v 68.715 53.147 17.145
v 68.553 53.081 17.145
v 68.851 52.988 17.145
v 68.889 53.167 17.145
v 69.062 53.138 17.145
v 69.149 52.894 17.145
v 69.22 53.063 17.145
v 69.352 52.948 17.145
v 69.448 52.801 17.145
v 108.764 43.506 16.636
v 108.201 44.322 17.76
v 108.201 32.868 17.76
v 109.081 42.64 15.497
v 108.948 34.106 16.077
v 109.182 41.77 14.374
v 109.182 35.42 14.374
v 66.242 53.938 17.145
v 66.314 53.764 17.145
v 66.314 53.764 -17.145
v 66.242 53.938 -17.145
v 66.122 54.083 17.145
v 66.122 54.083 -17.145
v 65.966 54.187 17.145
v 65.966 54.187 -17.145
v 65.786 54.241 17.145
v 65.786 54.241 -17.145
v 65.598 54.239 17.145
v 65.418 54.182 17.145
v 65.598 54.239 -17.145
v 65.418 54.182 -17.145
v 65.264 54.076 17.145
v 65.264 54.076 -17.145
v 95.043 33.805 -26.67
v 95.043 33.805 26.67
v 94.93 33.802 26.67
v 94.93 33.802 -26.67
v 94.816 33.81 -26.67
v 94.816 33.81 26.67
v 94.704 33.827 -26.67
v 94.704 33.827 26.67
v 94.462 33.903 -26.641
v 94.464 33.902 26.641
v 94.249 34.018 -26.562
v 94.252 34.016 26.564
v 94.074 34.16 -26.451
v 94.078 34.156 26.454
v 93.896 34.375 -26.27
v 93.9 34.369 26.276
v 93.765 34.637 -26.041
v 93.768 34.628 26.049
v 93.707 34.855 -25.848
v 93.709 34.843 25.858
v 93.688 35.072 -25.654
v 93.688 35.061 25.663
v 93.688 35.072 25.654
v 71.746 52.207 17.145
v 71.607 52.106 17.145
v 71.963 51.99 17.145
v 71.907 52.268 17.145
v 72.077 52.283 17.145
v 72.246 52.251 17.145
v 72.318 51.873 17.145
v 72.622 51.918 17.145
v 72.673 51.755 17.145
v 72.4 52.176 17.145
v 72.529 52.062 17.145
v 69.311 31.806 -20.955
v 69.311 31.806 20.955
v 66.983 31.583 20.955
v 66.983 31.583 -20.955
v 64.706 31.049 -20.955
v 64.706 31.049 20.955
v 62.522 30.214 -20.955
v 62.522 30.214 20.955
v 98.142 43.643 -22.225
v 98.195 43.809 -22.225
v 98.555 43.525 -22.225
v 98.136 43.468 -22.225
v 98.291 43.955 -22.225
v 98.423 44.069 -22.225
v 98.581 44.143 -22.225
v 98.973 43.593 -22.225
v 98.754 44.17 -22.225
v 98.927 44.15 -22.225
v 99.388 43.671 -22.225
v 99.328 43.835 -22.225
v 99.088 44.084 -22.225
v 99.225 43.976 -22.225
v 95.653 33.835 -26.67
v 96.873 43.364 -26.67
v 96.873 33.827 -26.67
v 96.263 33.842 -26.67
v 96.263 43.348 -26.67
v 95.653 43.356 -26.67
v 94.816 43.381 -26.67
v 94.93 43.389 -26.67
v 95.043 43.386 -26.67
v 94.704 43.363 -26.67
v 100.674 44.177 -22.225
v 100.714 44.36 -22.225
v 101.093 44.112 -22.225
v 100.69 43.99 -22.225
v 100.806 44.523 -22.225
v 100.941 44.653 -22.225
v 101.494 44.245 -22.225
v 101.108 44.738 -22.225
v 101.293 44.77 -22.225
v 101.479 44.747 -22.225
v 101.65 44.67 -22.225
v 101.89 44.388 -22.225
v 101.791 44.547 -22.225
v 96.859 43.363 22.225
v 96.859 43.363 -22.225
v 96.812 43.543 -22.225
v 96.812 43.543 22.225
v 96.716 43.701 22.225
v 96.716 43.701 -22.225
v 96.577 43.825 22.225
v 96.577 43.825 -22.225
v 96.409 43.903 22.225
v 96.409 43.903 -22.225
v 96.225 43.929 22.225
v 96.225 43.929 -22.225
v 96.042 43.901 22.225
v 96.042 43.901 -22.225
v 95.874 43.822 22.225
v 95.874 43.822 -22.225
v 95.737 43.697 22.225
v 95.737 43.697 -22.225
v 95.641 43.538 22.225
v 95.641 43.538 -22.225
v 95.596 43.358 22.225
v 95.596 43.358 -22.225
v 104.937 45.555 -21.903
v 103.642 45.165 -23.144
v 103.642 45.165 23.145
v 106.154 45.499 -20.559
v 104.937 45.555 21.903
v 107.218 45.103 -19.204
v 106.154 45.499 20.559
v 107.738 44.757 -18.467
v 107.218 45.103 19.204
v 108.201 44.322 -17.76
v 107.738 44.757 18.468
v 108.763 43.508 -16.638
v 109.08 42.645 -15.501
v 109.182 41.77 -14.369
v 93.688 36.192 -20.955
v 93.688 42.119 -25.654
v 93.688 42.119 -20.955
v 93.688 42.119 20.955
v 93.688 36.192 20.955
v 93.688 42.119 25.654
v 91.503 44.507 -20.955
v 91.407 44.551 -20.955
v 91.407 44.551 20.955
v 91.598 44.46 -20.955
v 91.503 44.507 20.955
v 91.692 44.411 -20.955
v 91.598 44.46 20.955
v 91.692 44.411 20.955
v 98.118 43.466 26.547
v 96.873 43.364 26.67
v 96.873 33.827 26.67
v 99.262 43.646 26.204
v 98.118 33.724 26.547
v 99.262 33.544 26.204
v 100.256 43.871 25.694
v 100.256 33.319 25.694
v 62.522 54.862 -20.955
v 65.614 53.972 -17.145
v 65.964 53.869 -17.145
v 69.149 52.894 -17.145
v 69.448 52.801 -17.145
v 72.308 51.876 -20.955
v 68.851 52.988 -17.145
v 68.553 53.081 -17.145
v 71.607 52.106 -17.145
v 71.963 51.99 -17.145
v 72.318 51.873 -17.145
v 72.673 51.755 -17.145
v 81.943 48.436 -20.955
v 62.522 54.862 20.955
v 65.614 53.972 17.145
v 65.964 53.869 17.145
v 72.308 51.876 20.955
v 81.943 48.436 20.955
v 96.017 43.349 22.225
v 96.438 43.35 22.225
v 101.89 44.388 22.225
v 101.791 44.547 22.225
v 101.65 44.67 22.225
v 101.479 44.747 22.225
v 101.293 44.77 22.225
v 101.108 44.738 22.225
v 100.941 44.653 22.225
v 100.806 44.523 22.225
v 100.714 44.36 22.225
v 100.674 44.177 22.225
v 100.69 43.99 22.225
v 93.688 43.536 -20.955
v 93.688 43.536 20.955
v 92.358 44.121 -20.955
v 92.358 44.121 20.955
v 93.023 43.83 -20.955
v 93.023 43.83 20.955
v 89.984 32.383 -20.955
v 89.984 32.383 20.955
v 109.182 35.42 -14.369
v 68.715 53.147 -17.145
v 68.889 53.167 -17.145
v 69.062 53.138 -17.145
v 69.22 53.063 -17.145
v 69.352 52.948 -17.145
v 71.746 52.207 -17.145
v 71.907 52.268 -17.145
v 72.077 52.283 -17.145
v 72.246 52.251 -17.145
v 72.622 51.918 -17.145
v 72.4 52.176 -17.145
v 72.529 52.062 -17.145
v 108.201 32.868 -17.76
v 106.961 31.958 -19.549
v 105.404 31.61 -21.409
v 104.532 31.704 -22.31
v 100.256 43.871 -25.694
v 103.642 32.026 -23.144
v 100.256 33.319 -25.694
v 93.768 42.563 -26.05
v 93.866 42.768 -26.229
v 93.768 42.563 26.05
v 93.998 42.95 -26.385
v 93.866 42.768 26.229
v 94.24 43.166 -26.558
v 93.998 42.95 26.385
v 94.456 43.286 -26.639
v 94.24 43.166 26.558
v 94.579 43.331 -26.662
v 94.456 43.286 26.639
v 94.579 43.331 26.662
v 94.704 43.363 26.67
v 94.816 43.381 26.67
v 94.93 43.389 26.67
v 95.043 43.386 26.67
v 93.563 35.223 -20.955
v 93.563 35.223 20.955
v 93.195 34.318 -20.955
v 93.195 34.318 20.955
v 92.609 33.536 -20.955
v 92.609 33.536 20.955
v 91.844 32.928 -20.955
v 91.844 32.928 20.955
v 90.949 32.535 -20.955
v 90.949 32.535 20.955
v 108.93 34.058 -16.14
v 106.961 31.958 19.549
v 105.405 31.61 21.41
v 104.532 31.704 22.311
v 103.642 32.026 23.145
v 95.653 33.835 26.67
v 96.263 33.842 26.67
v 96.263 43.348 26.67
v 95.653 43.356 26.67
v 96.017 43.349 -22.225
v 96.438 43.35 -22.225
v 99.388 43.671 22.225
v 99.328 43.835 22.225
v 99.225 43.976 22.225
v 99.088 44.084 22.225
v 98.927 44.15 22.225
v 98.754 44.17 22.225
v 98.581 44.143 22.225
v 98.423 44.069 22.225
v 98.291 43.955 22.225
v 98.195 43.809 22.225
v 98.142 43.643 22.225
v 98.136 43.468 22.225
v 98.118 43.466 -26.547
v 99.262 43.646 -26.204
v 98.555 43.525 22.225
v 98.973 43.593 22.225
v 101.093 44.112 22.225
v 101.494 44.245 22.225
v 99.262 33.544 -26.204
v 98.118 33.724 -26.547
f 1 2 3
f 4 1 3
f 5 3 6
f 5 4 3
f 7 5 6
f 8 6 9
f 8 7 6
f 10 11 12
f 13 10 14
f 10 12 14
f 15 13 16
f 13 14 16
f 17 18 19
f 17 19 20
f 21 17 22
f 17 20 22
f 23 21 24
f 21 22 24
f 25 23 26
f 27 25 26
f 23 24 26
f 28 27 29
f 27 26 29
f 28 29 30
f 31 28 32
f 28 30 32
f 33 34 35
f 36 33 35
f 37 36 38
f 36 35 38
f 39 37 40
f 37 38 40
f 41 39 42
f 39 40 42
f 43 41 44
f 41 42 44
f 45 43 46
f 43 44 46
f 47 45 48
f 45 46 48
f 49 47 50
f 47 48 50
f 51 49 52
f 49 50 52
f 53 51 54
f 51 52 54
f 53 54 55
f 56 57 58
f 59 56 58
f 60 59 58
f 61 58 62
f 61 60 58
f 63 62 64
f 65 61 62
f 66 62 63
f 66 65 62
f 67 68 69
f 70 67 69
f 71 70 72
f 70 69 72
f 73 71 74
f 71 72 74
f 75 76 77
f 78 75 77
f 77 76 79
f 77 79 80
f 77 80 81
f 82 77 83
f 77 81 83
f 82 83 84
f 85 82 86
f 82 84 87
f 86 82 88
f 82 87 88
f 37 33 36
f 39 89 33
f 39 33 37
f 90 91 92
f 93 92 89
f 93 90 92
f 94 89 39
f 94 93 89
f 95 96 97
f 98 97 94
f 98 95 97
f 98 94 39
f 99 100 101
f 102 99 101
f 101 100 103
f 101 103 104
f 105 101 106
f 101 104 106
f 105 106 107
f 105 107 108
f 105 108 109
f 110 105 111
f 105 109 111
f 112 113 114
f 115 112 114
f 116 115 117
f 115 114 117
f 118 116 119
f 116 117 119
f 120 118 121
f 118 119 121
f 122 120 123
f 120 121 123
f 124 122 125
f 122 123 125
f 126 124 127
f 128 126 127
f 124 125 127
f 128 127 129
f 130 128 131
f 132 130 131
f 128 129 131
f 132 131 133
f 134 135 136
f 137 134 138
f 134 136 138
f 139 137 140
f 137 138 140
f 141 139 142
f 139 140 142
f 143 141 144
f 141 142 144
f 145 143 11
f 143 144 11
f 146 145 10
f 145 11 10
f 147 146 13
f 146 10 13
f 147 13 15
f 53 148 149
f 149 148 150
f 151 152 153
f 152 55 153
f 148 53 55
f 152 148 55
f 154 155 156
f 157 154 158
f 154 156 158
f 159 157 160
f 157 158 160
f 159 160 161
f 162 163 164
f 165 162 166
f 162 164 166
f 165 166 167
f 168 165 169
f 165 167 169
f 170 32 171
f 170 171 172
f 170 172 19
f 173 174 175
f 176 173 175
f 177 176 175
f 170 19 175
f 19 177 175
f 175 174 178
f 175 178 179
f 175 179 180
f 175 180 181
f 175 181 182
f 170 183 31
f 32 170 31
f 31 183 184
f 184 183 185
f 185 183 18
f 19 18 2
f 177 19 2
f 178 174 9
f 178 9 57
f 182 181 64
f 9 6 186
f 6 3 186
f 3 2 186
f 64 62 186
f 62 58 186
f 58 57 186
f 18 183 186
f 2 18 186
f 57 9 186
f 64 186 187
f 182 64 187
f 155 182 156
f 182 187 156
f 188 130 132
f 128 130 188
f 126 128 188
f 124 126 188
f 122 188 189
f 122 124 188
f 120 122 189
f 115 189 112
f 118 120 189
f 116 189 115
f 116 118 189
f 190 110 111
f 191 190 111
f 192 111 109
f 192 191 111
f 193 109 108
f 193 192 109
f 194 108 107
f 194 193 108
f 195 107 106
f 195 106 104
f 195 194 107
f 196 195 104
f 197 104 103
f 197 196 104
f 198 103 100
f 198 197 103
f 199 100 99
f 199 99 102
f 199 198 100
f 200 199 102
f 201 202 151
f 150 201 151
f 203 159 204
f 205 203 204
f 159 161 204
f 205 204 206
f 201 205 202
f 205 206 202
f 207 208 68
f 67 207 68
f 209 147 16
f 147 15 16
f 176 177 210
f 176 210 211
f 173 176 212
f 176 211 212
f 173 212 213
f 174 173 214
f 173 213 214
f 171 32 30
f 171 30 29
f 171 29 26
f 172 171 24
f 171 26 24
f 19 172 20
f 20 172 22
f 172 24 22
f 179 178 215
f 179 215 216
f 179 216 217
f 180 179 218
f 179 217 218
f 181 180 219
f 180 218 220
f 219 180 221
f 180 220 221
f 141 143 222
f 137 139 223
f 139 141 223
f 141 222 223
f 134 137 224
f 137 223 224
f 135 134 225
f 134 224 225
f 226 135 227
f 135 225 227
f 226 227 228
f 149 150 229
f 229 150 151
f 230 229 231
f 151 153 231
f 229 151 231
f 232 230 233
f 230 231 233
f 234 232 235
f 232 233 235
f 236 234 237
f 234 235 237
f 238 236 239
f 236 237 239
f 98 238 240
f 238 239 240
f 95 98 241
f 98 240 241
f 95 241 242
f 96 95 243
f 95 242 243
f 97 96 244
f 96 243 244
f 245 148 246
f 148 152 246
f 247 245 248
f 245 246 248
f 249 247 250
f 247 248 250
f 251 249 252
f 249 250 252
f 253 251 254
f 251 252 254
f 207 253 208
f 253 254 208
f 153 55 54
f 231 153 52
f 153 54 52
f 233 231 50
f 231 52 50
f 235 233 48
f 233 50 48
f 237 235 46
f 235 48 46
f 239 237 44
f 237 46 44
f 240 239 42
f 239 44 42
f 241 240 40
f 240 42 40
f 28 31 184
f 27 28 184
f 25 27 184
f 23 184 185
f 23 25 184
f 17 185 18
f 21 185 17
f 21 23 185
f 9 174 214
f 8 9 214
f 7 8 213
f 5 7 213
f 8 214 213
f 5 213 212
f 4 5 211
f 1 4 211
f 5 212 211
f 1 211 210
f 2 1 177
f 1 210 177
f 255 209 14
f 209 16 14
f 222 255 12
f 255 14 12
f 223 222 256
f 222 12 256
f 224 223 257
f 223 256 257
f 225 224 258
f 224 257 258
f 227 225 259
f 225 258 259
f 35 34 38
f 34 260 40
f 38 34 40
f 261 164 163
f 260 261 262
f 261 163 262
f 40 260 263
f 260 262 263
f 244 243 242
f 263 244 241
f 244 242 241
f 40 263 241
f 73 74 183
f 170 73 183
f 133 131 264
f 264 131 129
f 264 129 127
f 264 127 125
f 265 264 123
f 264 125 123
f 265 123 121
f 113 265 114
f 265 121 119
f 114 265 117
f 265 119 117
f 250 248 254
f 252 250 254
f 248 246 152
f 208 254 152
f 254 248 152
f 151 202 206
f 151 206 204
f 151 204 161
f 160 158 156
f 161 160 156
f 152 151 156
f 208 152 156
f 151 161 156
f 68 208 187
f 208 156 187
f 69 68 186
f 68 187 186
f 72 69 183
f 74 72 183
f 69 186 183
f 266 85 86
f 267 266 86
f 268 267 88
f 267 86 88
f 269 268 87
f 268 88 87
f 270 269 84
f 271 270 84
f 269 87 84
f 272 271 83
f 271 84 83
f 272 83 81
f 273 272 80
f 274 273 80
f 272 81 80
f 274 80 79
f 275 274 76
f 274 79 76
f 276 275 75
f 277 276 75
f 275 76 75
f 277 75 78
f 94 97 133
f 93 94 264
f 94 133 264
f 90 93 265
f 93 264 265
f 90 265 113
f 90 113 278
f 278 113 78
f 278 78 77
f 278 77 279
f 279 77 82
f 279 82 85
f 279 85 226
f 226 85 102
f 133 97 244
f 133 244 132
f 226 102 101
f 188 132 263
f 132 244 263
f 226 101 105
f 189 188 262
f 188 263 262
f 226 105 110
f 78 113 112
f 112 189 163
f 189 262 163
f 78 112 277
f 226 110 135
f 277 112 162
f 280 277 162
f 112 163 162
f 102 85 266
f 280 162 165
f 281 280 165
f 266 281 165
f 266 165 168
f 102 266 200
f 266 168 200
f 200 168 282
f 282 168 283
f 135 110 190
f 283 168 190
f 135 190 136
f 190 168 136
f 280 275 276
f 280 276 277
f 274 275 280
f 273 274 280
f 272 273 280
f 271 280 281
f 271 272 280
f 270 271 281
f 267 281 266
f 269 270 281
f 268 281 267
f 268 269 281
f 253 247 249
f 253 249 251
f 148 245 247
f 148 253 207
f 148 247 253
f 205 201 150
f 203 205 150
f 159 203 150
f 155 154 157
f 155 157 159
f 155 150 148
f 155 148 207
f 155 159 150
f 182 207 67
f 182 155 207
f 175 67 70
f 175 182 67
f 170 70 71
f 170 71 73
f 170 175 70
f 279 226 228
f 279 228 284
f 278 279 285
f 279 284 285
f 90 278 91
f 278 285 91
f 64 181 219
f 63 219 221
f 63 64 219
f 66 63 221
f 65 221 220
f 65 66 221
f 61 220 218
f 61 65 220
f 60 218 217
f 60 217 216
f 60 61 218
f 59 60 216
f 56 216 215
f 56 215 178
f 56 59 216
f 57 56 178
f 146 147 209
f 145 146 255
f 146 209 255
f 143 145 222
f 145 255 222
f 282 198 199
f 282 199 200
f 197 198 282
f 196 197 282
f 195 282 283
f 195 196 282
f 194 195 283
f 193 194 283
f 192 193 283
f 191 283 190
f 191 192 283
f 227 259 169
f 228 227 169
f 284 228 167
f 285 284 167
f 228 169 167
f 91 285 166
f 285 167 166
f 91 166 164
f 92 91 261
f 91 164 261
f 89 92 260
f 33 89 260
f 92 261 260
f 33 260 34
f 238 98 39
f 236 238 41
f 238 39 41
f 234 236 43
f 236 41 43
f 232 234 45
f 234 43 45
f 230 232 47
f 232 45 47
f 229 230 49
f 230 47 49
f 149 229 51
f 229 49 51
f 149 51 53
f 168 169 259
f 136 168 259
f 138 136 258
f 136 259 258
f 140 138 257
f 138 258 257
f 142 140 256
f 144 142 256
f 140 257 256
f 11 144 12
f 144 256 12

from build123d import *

# Parameters (mm, degrees)
EXT_PEDAL_STEM_DEPTH     = 20.955
EXT_FOOT_SIDE_DEPTH      = 26.67
CUT_FOOT_PLAN_DEPTH      = 126.067228803
CUT_FOOT_PLAN_DEPTH_BACK = 126.067228803
SK_RIBS_STEM_R           = 0.635
EXT_RIBS_STEM_DEPTH      = 17.145
SK_RIBS_FOOT_R           = 0.635
EXT_RIBS_FOOT_DEPTH      = 22.225


with BuildPart() as part:
    # Sk_pedal_stem → Ext_pedal_stem (new, symmetric)
    with BuildSketch(Plane.XY):
        with BuildLine():
            Line((62.5221, 30.214062), (62.5221, 54.861968))
            ThreePointArc((62.5221, 54.861968), (77.145265739, 50.212536002), (91.40698, 44.550584))
            ThreePointArc((91.40698, 44.550584), (91.550950572, 44.483878693), (91.691968, 44.411138))
            ThreePointArc((91.691968, 44.411138), (92.690956134, 43.975699122), (93.6879, 43.5356))
            Line((93.6879, 43.5356), (93.6879, 36.191698))
            ThreePointArc((93.6879, 36.191698), (92.609350592, 33.535520735), (89.984326, 32.383222))
            Line((89.984326, 32.383222), (69.311266, 31.805626))
            ThreePointArc((69.311266, 31.805626), (65.835901534, 31.354435095), (62.5221, 30.214062))
        make_face()
    extrude(amount=EXT_PEDAL_STEM_DEPTH, both=True)

    # Sk_foot_side → Ext_foot_side (add, symmetric)
    with BuildSketch(Plane.XY):
        with BuildLine():
            Line((93.6879, 35.071812), (93.6879, 42.118788))
            ThreePointArc((93.6879, 42.118788), (94.090678285, 43.046595361), (95.043498, 43.385994))
            ThreePointArc((95.043498, 43.385994), (99.464687923, 43.686511406), (103.64216, 45.16501))
            ThreePointArc((103.64216, 45.16501), (107.36259935, 45.018864691), (109.1819, 41.7703))
            Line((109.1819, 41.7703), (109.1819, 35.4203))
            ThreePointArc((109.1819, 35.4203), (107.362602336, 32.171730436), (103.64216, 32.02559))
            ThreePointArc((103.64216, 32.02559), (99.464578688, 33.503560617), (95.043498, 33.804606))
            ThreePointArc((95.043498, 33.804606), (94.090614283, 34.143936173), (93.6879, 35.071812))
        make_face()
    extrude(amount=EXT_FOOT_SIDE_DEPTH, both=True)

    # Sk_foot_plan_trim → Cut_foot_plan (cut, two sides: drawn at the far end of the back side and taken through both)
    with BuildSketch(Plane(origin=(0, 0, 0), x_dir=(1, 0, 0), z_dir=(0, 1, 0)).offset(-CUT_FOOT_PLAN_DEPTH_BACK)):
        with BuildLine():
            Line((94.7039, -26.67), (96.87306, -26.67))
            ThreePointArc((96.87306, -26.67), (98.633684187, -26.421041098), (100.25634, -25.693878))
            ThreePointArc((100.25634, -25.693878), (104.672679306, -22.171677589), (108.200952, -17.760188))
            ThreePointArc((108.200952, -17.760188), (108.932068295, -16.134088594), (109.1819, -14.36878))
            Line((109.1819, -14.36878), (109.1819, 14.36878))
            ThreePointArc((109.1819, 14.36878), (108.931624488, 16.133960225), (108.200952, 17.760188))
            ThreePointArc((108.200952, 17.760188), (104.672363352, 22.1713612), (100.25634, 25.693878))
            ThreePointArc((100.25634, 25.693878), (98.633741991, 26.421241452), (96.87306, 26.67))
            Line((96.87306, 26.67), (94.7039, 26.67))
            ThreePointArc((94.7039, 26.67), (93.98547951, 26.37242049), (93.6879, 25.654))
            Line((93.6879, 25.654), (93.6879, 40.64))
            Line((93.6879, 40.64), (119.38, 40.64))
            Line((119.38, 40.64), (119.38, -40.64))
            Line((119.38, -40.64), (93.6879, -40.64))
            Line((93.6879, -40.64), (93.6879, -25.654))
            ThreePointArc((93.6879, -25.654), (93.98547951, -26.37242049), (94.7039, -26.67))
        make_face()
    extrude(amount=CUT_FOOT_PLAN_DEPTH + CUT_FOOT_PLAN_DEPTH_BACK, mode=Mode.SUBTRACT)

    # Sk_ribs_stem → Ext_ribs_stem (add, symmetric)
    with BuildSketch(Plane.XY):
        with Locations((65.6971, 53.61178)):
            Circle(SK_RIBS_STEM_R)
        with Locations((68.8721, 52.53228)):
            Circle(SK_RIBS_STEM_R)
        with Locations((72.0471, 51.64836)):
            Circle(SK_RIBS_STEM_R)
    extrude(amount=EXT_RIBS_STEM_DEPTH, both=True)

    # Sk_ribs_foot → Ext_ribs_foot (add, symmetric)
    with BuildSketch(Plane.XY):
        with Locations((96.2279, 43.2943)):
            Circle(SK_RIBS_FOOT_R)
        with Locations((98.7679, 43.5356)):
            Circle(SK_RIBS_FOOT_R)
        with Locations((101.3079, 44.13504)):
            Circle(SK_RIBS_FOOT_R)
    extrude(amount=EXT_RIBS_FOOT_DEPTH, both=True)


solid = part.part
